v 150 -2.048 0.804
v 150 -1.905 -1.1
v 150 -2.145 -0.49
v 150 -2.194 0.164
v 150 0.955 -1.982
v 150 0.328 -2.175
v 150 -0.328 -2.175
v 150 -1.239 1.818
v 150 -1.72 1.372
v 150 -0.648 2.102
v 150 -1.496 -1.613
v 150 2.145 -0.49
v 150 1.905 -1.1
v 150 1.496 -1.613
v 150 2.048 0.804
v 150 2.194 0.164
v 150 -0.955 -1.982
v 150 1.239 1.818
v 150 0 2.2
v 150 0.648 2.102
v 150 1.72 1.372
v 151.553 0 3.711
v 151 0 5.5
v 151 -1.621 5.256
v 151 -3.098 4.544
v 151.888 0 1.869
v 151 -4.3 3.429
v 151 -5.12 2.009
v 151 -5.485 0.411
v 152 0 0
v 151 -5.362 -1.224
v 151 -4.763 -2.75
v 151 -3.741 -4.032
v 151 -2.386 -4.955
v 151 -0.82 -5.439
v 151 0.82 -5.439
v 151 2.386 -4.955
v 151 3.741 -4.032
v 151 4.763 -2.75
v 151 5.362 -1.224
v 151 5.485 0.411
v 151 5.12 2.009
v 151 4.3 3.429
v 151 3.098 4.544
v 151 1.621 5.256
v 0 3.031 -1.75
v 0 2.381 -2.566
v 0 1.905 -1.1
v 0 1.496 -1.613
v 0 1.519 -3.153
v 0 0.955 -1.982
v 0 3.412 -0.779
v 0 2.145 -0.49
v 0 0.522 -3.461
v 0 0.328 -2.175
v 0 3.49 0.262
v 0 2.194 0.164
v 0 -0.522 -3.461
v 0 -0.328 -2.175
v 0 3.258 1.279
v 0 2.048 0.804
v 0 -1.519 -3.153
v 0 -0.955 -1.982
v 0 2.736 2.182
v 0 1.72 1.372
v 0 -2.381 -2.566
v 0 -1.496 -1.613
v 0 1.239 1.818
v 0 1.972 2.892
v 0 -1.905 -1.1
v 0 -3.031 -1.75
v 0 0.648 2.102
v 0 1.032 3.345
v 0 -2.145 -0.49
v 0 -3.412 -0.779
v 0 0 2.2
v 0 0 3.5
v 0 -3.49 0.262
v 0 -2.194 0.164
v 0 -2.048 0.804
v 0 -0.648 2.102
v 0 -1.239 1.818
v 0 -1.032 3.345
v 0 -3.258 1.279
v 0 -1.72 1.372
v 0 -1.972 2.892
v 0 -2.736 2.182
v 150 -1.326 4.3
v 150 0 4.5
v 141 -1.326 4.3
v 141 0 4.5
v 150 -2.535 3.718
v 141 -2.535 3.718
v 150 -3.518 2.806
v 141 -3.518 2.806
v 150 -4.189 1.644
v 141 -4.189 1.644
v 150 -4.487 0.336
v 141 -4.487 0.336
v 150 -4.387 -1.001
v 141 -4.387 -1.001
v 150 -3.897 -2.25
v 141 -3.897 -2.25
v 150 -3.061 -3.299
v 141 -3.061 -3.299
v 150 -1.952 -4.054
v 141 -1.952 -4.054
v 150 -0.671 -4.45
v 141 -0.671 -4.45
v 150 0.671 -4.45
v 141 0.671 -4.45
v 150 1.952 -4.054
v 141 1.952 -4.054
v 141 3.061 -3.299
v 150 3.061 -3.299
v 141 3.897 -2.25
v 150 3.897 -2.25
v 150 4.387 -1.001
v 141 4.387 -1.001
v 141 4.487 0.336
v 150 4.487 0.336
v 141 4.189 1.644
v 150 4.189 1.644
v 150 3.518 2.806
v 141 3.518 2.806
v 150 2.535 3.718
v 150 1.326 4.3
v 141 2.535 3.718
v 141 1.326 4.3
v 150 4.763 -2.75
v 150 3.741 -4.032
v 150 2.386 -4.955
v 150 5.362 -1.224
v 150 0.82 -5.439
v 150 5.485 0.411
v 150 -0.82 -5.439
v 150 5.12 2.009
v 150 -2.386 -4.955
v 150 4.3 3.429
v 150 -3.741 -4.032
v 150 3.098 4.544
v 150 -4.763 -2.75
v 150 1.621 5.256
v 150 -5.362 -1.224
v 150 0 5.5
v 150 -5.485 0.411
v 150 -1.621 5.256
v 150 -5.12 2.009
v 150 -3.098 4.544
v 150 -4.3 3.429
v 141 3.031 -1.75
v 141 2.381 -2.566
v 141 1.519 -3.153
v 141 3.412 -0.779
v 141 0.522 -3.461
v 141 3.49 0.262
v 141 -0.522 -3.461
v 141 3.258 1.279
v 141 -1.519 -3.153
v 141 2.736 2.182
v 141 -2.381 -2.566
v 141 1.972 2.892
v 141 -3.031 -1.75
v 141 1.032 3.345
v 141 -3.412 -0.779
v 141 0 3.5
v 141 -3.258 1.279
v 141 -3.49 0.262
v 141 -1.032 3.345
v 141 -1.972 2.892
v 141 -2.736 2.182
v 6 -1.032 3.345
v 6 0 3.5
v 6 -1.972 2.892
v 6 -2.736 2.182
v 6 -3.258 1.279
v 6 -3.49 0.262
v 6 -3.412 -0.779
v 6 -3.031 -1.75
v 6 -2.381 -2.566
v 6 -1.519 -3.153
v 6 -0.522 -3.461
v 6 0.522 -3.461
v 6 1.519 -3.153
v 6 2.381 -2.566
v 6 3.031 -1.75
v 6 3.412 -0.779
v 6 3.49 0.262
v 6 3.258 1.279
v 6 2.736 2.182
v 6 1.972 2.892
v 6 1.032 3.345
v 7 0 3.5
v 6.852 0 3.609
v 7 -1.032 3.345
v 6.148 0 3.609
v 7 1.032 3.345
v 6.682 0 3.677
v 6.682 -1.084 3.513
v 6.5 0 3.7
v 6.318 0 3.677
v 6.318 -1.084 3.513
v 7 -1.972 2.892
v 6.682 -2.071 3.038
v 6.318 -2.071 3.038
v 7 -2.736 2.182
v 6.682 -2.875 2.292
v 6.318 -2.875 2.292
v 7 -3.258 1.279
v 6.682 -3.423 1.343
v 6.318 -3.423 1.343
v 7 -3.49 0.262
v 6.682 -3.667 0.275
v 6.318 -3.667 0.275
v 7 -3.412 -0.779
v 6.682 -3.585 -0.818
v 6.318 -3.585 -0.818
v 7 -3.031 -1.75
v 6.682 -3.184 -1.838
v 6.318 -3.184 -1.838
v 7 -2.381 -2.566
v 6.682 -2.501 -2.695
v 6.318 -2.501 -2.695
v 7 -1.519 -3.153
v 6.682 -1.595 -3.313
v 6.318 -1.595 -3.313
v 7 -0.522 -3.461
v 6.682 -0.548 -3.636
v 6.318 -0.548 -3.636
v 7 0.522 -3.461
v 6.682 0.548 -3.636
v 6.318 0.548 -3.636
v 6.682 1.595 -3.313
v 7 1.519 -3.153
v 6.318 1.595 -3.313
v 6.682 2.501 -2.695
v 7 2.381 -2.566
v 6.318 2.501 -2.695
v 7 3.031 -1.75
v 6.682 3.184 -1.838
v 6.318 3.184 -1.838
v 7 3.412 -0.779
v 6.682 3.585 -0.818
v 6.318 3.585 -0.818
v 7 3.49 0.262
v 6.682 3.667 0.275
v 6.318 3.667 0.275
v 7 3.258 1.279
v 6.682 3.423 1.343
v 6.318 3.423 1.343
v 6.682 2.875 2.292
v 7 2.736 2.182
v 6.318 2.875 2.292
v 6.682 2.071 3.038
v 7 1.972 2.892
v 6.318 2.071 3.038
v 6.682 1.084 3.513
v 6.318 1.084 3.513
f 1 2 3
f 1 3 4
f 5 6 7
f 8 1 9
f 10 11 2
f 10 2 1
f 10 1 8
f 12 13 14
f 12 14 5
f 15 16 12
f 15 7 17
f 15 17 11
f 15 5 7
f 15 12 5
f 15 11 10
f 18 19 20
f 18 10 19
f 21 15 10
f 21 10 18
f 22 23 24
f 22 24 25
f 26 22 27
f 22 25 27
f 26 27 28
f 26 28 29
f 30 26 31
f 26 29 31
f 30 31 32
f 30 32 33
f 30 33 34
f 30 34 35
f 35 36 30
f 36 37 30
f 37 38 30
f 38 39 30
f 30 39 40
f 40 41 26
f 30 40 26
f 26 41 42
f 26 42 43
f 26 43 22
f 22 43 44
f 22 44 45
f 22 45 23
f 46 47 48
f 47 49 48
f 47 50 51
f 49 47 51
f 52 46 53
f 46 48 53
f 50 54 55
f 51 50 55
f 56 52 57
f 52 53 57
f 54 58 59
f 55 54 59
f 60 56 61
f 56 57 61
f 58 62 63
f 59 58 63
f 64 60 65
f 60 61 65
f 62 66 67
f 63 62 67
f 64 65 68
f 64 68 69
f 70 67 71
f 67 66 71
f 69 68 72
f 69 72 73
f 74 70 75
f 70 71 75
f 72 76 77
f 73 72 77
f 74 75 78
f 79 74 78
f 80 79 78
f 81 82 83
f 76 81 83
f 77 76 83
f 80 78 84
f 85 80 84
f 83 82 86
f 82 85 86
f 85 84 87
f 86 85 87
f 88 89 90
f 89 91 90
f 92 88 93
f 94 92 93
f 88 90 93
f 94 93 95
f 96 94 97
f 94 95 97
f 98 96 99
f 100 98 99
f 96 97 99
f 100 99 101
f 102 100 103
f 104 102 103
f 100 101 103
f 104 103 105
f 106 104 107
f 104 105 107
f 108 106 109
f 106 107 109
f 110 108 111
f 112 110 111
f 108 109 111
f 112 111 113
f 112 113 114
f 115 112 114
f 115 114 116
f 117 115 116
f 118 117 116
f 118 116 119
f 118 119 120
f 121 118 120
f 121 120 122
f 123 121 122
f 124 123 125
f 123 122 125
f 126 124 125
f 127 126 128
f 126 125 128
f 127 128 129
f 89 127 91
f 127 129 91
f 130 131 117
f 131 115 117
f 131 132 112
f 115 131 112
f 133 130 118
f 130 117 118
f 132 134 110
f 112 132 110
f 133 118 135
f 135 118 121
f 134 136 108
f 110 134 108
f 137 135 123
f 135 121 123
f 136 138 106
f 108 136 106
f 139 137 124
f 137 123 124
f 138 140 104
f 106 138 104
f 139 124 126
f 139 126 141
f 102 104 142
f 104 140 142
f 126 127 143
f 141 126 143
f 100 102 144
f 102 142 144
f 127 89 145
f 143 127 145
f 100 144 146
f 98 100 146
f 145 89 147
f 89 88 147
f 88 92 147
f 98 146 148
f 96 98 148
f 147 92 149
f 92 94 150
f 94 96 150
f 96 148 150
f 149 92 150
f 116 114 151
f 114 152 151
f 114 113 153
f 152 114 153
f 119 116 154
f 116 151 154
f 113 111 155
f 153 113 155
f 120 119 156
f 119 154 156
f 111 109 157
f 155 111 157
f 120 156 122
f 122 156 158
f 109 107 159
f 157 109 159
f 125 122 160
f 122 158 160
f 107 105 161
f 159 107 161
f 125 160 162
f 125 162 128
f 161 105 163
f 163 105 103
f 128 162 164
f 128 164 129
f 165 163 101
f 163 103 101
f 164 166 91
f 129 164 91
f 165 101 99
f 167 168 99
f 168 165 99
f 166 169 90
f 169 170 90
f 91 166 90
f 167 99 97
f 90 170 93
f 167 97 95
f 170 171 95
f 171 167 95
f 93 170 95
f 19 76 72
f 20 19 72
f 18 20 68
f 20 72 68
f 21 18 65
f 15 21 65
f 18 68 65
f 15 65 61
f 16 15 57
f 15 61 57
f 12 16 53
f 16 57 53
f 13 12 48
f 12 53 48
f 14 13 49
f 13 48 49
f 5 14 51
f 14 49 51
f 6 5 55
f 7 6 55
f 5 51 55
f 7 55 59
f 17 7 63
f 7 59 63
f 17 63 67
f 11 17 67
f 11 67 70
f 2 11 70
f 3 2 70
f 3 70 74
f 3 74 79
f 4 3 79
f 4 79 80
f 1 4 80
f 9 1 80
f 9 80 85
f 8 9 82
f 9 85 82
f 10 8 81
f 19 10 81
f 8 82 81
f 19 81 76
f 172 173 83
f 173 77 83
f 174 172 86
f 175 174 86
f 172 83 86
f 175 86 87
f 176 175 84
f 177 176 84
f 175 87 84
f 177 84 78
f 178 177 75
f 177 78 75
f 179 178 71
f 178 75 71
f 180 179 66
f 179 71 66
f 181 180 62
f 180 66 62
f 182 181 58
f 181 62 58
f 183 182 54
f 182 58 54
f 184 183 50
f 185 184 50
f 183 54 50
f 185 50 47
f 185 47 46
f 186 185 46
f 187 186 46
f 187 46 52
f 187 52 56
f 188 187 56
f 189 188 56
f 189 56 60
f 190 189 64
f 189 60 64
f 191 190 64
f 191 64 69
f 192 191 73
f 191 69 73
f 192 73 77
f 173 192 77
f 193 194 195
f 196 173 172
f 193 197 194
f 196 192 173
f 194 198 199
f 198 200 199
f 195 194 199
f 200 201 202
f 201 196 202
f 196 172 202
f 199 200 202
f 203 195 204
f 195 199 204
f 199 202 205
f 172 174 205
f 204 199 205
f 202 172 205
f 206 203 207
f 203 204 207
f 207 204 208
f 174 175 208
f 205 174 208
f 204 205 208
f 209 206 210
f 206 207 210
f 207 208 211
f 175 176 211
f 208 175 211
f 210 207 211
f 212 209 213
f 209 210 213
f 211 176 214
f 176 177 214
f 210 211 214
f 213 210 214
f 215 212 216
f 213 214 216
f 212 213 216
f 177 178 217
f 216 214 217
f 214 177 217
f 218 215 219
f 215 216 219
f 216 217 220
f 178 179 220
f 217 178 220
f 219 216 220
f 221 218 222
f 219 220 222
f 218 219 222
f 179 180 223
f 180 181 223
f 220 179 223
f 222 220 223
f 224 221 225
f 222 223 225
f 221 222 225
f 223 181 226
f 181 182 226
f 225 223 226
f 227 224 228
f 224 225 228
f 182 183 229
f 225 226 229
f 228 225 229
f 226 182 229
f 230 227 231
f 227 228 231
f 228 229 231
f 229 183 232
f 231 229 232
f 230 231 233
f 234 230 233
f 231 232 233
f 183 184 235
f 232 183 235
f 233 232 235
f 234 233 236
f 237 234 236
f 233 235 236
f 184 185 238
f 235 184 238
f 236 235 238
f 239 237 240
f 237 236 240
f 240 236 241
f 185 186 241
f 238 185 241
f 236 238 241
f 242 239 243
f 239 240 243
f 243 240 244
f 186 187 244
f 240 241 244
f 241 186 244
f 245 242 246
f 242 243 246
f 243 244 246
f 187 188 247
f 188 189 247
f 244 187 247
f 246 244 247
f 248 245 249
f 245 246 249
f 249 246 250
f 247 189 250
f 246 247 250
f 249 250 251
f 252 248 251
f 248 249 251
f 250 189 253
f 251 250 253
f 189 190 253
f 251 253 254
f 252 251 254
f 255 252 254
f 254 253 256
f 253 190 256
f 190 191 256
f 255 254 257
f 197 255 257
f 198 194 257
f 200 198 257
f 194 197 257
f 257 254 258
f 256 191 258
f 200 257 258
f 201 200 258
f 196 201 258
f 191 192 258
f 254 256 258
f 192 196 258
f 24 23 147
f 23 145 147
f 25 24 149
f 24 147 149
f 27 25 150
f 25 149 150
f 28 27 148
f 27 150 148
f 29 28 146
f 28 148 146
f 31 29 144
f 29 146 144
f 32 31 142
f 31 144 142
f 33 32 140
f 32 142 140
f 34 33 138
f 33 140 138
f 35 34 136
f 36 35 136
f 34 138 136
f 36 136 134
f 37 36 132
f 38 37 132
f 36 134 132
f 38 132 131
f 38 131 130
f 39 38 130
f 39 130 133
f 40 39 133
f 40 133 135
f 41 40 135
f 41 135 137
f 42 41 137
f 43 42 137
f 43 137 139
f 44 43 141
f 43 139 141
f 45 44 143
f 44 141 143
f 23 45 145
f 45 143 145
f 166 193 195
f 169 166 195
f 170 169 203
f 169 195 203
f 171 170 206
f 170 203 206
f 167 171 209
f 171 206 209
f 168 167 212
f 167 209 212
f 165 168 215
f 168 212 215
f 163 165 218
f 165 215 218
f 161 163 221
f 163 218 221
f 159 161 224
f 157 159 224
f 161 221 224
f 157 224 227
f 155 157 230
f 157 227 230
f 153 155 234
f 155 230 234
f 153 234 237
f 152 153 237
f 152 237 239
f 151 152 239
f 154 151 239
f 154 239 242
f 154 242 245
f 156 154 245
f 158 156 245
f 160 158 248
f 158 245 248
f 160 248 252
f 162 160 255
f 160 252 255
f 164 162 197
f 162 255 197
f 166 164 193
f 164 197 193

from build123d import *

# Parameters (mm, degrees)
SKETCH3_R          = 2.2
CUT_EXTRUDE1_DEPTH = 150


with BuildPart() as part:
    # Sketch1 → Revolve1 (revolve)
    with BuildSketch(Plane.XY, mode=Mode.PRIVATE) as revolve1_sk:
        with BuildLine():
            Line((0, 0), (152, 0))
            ThreePointArc((152, 0), (151.747967345, 2.795084972), (151, 5.5))
            Line((151, 5.5), (150, 5.5))
            Line((150, 5.5), (150, 4.5))
            Line((150, 4.5), (141, 4.5))
            Line((141, 4.5), (141, 3.5))
            Line((141, 3.5), (0, 3.5))
            Line((0, 3.5), (0, 0))
        make_face()
    revolve(revolve1_sk.sketch.rotate(Axis((0, 0, 0), (1, 0, 0)), 90), axis=Axis((0, 0, 0), (1, 0, 0)))

    # Sketch2 → Revolve2 (revolve)
    with BuildSketch(Plane.XY, mode=Mode.PRIVATE) as revolve2_sk:
        with BuildLine():
            Line((6, 0), (7, 0))
            Line((7, 0), (7, 3.5))
            ThreePointArc((7, 3.5), (6.5, 3.7), (6, 3.5))
            Line((6, 3.5), (6, 0))
        make_face()
    revolve(revolve2_sk.sketch.rotate(Axis((6, 0, 0), (1, 0, 0)), 90), axis=Axis((6, 0, 0), (1, 0, 0)))

    # Sketch3 → Cut-Extrude1 (cut)
    with BuildSketch(Plane.ZY):
        Circle(SKETCH3_R)
    extrude(amount=-CUT_EXTRUDE1_DEPTH, mode=Mode.SUBTRACT)


solid = part.part
